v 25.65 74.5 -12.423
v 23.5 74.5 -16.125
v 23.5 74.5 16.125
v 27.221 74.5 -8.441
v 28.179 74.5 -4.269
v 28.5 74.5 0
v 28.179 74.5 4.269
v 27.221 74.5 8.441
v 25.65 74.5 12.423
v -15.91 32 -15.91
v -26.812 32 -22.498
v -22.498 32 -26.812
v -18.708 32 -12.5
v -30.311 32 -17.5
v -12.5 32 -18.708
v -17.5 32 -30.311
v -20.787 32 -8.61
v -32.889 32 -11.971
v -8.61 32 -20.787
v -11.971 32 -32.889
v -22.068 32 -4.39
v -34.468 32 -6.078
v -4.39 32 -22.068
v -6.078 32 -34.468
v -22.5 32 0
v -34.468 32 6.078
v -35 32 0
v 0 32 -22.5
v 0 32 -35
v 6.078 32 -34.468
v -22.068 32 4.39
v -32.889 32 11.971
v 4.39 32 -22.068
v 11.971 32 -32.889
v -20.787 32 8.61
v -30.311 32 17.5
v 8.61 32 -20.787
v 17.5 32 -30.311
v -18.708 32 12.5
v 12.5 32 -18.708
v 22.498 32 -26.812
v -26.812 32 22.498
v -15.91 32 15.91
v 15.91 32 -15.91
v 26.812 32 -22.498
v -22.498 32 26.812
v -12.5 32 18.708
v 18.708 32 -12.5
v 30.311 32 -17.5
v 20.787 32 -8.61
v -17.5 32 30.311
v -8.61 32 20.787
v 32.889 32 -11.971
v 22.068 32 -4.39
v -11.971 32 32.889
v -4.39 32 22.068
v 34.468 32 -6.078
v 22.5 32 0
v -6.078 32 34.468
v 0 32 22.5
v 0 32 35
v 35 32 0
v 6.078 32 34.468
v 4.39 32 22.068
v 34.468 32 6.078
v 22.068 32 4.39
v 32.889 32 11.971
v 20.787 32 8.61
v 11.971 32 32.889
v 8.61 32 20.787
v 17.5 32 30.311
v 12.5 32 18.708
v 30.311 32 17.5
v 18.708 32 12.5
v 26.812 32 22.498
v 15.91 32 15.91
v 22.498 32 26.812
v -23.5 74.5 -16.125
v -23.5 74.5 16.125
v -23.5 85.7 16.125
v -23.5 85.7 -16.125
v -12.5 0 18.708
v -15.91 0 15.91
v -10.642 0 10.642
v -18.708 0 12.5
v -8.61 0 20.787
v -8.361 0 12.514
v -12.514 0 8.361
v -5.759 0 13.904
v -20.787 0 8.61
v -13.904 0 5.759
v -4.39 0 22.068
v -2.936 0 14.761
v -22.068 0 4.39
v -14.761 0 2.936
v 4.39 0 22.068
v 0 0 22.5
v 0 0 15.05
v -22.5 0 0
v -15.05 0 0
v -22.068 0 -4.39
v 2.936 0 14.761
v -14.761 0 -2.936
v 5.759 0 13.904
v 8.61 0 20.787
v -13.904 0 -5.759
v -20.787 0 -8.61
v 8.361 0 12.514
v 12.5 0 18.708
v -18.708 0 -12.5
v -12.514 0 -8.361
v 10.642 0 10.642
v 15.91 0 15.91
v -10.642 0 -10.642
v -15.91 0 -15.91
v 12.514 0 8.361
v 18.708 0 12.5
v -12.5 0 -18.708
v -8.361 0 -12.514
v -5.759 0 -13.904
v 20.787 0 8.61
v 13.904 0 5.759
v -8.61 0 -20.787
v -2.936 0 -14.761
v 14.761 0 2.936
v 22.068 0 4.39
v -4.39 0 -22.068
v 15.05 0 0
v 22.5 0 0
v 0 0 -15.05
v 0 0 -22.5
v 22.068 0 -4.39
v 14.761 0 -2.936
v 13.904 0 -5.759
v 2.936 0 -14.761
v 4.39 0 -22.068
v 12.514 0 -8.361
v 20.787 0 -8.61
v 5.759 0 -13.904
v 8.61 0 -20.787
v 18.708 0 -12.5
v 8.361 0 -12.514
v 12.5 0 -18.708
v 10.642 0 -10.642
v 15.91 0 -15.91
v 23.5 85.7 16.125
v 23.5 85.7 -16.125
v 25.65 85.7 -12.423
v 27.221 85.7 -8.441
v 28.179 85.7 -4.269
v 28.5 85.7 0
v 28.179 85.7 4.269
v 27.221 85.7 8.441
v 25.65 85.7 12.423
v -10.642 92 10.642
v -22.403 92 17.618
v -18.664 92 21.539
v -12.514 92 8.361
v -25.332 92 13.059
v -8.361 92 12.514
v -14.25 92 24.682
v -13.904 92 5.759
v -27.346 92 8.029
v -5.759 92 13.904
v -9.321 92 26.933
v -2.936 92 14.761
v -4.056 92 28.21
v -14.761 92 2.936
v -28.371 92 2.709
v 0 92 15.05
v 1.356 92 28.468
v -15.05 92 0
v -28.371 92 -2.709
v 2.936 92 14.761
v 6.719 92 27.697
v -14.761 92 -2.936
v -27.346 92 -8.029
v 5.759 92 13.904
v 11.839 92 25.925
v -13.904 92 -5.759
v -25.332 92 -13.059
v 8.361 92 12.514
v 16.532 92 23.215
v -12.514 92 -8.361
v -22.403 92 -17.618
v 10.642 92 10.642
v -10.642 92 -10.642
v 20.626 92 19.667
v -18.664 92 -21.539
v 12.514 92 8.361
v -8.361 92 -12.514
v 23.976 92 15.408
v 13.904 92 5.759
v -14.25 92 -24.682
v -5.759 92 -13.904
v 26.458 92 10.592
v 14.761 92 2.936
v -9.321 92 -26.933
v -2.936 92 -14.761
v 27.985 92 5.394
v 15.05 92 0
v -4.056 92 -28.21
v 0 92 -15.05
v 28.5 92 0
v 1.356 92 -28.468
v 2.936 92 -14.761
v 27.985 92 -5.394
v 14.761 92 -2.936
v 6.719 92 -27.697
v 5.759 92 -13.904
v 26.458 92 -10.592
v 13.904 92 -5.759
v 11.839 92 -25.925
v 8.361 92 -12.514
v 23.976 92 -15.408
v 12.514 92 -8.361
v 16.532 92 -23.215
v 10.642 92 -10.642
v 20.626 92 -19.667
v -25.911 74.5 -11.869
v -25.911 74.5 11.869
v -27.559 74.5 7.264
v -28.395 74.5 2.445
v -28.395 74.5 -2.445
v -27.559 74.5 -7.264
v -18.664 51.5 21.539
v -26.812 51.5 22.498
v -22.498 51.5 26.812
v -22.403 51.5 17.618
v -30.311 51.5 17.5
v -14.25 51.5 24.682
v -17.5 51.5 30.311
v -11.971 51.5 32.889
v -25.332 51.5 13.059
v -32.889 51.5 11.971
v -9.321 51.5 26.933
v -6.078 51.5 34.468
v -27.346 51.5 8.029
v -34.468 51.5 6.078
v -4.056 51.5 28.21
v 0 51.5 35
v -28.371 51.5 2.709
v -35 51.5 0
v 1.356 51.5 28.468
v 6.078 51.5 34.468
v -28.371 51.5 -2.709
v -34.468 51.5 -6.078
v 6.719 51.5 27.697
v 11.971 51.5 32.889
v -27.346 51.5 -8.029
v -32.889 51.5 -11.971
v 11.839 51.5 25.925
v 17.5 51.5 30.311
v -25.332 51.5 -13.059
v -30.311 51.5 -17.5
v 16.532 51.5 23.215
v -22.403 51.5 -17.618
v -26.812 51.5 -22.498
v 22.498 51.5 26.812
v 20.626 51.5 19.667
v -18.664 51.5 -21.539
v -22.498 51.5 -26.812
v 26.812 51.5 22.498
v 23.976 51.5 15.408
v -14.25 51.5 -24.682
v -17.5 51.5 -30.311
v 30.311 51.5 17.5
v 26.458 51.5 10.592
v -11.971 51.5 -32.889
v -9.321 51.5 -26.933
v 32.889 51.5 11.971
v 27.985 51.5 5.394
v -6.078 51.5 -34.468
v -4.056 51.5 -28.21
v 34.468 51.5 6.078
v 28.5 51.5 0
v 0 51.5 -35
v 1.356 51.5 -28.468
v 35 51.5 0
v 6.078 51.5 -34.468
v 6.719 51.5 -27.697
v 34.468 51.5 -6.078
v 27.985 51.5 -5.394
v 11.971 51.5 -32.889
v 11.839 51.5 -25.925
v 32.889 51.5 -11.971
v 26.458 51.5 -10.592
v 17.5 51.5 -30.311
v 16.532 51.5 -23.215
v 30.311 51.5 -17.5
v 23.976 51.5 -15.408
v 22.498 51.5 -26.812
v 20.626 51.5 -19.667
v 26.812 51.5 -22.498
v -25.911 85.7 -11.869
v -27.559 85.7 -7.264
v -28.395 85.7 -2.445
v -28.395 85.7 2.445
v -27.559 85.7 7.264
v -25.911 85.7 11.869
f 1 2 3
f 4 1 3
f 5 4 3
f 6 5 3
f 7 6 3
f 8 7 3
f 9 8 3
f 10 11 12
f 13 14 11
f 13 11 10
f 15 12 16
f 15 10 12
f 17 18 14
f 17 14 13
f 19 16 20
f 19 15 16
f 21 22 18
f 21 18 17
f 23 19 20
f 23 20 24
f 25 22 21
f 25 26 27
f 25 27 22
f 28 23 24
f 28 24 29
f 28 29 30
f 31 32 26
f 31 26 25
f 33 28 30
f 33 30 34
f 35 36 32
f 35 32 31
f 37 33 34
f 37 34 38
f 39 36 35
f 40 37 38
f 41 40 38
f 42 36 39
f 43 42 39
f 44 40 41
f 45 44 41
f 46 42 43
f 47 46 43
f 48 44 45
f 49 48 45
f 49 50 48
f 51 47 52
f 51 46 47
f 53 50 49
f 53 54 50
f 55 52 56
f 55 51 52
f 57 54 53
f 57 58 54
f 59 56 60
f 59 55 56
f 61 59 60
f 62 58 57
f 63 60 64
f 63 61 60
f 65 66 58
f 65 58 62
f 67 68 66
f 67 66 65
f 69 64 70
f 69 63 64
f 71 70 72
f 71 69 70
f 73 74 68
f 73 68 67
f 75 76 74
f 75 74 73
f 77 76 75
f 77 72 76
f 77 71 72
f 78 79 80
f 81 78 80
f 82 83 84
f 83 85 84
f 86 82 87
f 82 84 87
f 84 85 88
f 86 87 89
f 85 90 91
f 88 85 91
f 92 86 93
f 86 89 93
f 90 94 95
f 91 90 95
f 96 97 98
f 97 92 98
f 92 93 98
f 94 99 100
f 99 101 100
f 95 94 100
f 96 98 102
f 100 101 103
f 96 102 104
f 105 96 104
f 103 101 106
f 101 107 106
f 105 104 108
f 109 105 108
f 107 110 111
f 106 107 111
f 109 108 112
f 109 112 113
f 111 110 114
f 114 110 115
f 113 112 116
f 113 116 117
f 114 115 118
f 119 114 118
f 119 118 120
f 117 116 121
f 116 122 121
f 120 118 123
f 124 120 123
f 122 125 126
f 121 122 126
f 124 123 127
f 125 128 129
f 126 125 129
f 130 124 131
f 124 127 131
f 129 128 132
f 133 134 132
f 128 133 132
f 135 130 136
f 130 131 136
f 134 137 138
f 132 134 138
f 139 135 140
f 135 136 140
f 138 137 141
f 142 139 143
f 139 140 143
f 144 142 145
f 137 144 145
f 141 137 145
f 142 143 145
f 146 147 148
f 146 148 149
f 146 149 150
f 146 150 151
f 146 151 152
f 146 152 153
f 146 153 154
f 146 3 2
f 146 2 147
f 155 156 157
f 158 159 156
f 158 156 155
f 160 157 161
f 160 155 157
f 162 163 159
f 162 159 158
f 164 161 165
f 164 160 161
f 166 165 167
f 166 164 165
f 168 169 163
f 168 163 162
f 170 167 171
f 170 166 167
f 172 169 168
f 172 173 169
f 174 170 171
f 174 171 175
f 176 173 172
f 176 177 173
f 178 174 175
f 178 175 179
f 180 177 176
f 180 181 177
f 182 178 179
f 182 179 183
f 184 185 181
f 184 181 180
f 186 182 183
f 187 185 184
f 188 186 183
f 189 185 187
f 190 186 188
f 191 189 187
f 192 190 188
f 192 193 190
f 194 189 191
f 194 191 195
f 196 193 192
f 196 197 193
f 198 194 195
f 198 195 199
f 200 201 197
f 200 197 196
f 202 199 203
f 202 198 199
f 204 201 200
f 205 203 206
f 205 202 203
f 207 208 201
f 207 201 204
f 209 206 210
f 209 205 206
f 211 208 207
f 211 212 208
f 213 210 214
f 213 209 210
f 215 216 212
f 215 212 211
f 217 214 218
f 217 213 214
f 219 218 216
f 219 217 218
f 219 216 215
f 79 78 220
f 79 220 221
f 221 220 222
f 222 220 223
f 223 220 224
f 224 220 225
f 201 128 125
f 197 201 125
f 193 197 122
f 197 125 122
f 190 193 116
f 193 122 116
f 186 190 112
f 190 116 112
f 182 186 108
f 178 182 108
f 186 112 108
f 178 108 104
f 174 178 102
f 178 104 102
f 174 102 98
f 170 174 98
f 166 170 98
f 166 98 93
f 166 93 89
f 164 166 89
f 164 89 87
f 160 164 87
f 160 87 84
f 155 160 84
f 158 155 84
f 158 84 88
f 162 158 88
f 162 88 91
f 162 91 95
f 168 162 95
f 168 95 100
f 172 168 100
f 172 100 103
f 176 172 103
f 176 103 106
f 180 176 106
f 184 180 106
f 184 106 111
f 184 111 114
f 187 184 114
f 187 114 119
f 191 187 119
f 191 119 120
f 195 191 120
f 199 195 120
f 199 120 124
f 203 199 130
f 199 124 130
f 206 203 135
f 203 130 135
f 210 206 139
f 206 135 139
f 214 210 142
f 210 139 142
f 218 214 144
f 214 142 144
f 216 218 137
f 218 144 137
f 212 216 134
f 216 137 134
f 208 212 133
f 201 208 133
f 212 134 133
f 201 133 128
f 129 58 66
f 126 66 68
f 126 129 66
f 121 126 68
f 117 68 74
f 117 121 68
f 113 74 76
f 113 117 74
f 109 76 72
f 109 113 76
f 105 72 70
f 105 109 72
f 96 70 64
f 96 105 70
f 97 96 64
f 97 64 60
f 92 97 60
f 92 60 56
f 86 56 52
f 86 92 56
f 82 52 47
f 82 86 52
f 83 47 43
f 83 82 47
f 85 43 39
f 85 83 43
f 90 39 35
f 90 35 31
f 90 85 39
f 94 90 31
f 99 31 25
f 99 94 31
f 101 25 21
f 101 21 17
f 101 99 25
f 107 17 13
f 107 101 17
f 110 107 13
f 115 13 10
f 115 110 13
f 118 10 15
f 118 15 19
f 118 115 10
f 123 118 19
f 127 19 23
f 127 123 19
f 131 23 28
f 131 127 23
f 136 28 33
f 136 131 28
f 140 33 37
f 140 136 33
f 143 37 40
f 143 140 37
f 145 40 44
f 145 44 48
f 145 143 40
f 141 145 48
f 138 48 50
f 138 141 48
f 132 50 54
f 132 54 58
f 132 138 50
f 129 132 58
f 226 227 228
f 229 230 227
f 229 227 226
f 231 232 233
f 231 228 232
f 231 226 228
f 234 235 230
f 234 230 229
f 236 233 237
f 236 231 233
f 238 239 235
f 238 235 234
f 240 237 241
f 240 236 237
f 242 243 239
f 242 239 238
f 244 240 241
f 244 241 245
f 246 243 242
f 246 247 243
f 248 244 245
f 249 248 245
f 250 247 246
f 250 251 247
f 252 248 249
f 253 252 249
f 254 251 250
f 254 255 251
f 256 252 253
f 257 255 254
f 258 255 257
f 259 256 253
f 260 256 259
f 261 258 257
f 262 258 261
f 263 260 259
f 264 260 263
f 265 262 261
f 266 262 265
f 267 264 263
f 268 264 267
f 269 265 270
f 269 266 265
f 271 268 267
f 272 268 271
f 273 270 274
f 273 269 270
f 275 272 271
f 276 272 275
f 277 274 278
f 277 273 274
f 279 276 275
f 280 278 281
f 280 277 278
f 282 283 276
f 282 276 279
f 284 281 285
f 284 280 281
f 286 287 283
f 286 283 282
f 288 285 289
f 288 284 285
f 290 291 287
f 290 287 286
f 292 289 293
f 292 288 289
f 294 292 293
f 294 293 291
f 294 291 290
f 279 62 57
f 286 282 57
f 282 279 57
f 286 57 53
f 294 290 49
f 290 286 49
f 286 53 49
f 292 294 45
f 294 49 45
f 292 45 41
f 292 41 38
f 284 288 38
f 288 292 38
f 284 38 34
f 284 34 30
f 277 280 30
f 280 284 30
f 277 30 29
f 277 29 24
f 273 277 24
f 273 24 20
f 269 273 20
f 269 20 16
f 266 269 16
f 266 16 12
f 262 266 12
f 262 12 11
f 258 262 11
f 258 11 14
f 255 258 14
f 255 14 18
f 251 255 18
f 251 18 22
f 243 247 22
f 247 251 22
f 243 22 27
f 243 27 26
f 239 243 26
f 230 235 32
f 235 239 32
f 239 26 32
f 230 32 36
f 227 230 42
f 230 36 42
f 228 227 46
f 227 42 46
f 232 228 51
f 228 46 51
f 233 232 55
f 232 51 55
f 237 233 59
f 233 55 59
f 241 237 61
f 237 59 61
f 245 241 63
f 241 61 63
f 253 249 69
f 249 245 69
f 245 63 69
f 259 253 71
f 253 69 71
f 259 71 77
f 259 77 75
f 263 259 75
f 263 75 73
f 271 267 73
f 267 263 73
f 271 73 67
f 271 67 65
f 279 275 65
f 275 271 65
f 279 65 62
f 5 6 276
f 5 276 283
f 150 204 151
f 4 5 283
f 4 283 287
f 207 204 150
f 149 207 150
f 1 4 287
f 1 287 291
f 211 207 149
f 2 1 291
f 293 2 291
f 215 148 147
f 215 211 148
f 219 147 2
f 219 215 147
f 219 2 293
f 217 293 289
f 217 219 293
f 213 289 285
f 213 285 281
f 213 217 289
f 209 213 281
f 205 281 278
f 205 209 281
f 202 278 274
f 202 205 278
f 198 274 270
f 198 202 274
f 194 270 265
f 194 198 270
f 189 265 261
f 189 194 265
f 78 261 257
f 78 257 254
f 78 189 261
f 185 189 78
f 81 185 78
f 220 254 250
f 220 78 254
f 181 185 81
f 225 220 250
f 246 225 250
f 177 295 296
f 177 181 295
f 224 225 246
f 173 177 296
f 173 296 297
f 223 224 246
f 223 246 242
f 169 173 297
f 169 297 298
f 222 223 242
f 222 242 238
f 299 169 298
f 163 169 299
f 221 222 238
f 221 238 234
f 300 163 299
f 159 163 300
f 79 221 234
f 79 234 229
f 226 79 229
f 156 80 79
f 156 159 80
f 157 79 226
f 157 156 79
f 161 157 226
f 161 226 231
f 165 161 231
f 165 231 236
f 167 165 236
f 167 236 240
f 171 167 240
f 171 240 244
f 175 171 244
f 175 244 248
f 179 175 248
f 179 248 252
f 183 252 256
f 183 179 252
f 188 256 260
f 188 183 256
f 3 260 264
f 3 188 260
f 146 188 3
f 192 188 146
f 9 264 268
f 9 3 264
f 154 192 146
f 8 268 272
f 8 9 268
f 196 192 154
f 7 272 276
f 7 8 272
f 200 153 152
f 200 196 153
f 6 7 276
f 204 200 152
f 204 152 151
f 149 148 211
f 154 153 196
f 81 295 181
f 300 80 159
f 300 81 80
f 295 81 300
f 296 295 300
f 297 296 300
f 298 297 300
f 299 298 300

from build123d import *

# Parameters (mm, degrees)
SKETCH1_R            = 35
BOSS_EXTRUDE1_DEPTH  = 92
SKETCH2_OUTSIDE_W    = 99.028
SKETCH2_OUTSIDE_H    = 99.028
SKETCH2_OUTSIDE_R    = 28.5
CUT_EXTRUDE1_DEPTH   = 40.5
SKETCH3_OUTSIDE_W    = 99.028
SKETCH3_OUTSIDE_H    = 99.028
SKETCH3_OUTSIDE_R    = 22.5
CUT_EXTRUDE2_DEPTH   = 32
SKETCH4_R            = 15.05
CUT_EXTRUDE3_DEPTH   = 93
SKETCH5_W            = 5
SKETCH5_H            = 11.2
TESTINGFEATURE_DEPTH = 36


with BuildPart() as part:
    # Sketch1 → Boss-Extrude1 (new body)
    with BuildSketch(Plane(origin=(0, 0, 0), x_dir=(1, 0, 0), z_dir=(0, 1, 0))):
        Circle(SKETCH1_R)
    extrude(amount=BOSS_EXTRUDE1_DEPTH)

    # Sketch2 outside → Cut-Extrude1 (cut)
    with BuildSketch(Plane(origin=(0, 92, 0), x_dir=(1, 0, 0), z_dir=(0, 1, 0))):
        Rectangle(SKETCH2_OUTSIDE_W, SKETCH2_OUTSIDE_H)
        Circle(SKETCH2_OUTSIDE_R, mode=Mode.SUBTRACT)
    extrude(amount=-CUT_EXTRUDE1_DEPTH, mode=Mode.SUBTRACT)

    # Sketch3 outside → Cut-Extrude2 (cut)
    with BuildSketch(Plane.XZ):
        Rectangle(SKETCH3_OUTSIDE_W, SKETCH3_OUTSIDE_H)
        Circle(SKETCH3_OUTSIDE_R, mode=Mode.SUBTRACT)
    extrude(amount=-CUT_EXTRUDE2_DEPTH, mode=Mode.SUBTRACT)

    # Sketch4 → Cut-Extrude3 (cut, through all)
    with BuildSketch(Plane.XZ):
        Circle(SKETCH4_R)
    extrude(amount=-CUT_EXTRUDE3_DEPTH, mode=Mode.SUBTRACT)

    # Sketch5 → TestingFeature (cut, symmetric)
    with BuildSketch(Plane.XY):
        with Locations((26, 80.1)):
            Rectangle(SKETCH5_W, SKETCH5_H)
    testingfeature = extrude(amount=TESTINGFEATURE_DEPTH, both=True, mode=Mode.SUBTRACT)

    # Mirror1: TestingFeature across plane
    add(testingfeature.mirror(Plane(origin=(0, 0, 0), x_dir=(0, 0, 1), z_dir=(1, 0, 0))), mode=Mode.SUBTRACT)


solid = part.part
